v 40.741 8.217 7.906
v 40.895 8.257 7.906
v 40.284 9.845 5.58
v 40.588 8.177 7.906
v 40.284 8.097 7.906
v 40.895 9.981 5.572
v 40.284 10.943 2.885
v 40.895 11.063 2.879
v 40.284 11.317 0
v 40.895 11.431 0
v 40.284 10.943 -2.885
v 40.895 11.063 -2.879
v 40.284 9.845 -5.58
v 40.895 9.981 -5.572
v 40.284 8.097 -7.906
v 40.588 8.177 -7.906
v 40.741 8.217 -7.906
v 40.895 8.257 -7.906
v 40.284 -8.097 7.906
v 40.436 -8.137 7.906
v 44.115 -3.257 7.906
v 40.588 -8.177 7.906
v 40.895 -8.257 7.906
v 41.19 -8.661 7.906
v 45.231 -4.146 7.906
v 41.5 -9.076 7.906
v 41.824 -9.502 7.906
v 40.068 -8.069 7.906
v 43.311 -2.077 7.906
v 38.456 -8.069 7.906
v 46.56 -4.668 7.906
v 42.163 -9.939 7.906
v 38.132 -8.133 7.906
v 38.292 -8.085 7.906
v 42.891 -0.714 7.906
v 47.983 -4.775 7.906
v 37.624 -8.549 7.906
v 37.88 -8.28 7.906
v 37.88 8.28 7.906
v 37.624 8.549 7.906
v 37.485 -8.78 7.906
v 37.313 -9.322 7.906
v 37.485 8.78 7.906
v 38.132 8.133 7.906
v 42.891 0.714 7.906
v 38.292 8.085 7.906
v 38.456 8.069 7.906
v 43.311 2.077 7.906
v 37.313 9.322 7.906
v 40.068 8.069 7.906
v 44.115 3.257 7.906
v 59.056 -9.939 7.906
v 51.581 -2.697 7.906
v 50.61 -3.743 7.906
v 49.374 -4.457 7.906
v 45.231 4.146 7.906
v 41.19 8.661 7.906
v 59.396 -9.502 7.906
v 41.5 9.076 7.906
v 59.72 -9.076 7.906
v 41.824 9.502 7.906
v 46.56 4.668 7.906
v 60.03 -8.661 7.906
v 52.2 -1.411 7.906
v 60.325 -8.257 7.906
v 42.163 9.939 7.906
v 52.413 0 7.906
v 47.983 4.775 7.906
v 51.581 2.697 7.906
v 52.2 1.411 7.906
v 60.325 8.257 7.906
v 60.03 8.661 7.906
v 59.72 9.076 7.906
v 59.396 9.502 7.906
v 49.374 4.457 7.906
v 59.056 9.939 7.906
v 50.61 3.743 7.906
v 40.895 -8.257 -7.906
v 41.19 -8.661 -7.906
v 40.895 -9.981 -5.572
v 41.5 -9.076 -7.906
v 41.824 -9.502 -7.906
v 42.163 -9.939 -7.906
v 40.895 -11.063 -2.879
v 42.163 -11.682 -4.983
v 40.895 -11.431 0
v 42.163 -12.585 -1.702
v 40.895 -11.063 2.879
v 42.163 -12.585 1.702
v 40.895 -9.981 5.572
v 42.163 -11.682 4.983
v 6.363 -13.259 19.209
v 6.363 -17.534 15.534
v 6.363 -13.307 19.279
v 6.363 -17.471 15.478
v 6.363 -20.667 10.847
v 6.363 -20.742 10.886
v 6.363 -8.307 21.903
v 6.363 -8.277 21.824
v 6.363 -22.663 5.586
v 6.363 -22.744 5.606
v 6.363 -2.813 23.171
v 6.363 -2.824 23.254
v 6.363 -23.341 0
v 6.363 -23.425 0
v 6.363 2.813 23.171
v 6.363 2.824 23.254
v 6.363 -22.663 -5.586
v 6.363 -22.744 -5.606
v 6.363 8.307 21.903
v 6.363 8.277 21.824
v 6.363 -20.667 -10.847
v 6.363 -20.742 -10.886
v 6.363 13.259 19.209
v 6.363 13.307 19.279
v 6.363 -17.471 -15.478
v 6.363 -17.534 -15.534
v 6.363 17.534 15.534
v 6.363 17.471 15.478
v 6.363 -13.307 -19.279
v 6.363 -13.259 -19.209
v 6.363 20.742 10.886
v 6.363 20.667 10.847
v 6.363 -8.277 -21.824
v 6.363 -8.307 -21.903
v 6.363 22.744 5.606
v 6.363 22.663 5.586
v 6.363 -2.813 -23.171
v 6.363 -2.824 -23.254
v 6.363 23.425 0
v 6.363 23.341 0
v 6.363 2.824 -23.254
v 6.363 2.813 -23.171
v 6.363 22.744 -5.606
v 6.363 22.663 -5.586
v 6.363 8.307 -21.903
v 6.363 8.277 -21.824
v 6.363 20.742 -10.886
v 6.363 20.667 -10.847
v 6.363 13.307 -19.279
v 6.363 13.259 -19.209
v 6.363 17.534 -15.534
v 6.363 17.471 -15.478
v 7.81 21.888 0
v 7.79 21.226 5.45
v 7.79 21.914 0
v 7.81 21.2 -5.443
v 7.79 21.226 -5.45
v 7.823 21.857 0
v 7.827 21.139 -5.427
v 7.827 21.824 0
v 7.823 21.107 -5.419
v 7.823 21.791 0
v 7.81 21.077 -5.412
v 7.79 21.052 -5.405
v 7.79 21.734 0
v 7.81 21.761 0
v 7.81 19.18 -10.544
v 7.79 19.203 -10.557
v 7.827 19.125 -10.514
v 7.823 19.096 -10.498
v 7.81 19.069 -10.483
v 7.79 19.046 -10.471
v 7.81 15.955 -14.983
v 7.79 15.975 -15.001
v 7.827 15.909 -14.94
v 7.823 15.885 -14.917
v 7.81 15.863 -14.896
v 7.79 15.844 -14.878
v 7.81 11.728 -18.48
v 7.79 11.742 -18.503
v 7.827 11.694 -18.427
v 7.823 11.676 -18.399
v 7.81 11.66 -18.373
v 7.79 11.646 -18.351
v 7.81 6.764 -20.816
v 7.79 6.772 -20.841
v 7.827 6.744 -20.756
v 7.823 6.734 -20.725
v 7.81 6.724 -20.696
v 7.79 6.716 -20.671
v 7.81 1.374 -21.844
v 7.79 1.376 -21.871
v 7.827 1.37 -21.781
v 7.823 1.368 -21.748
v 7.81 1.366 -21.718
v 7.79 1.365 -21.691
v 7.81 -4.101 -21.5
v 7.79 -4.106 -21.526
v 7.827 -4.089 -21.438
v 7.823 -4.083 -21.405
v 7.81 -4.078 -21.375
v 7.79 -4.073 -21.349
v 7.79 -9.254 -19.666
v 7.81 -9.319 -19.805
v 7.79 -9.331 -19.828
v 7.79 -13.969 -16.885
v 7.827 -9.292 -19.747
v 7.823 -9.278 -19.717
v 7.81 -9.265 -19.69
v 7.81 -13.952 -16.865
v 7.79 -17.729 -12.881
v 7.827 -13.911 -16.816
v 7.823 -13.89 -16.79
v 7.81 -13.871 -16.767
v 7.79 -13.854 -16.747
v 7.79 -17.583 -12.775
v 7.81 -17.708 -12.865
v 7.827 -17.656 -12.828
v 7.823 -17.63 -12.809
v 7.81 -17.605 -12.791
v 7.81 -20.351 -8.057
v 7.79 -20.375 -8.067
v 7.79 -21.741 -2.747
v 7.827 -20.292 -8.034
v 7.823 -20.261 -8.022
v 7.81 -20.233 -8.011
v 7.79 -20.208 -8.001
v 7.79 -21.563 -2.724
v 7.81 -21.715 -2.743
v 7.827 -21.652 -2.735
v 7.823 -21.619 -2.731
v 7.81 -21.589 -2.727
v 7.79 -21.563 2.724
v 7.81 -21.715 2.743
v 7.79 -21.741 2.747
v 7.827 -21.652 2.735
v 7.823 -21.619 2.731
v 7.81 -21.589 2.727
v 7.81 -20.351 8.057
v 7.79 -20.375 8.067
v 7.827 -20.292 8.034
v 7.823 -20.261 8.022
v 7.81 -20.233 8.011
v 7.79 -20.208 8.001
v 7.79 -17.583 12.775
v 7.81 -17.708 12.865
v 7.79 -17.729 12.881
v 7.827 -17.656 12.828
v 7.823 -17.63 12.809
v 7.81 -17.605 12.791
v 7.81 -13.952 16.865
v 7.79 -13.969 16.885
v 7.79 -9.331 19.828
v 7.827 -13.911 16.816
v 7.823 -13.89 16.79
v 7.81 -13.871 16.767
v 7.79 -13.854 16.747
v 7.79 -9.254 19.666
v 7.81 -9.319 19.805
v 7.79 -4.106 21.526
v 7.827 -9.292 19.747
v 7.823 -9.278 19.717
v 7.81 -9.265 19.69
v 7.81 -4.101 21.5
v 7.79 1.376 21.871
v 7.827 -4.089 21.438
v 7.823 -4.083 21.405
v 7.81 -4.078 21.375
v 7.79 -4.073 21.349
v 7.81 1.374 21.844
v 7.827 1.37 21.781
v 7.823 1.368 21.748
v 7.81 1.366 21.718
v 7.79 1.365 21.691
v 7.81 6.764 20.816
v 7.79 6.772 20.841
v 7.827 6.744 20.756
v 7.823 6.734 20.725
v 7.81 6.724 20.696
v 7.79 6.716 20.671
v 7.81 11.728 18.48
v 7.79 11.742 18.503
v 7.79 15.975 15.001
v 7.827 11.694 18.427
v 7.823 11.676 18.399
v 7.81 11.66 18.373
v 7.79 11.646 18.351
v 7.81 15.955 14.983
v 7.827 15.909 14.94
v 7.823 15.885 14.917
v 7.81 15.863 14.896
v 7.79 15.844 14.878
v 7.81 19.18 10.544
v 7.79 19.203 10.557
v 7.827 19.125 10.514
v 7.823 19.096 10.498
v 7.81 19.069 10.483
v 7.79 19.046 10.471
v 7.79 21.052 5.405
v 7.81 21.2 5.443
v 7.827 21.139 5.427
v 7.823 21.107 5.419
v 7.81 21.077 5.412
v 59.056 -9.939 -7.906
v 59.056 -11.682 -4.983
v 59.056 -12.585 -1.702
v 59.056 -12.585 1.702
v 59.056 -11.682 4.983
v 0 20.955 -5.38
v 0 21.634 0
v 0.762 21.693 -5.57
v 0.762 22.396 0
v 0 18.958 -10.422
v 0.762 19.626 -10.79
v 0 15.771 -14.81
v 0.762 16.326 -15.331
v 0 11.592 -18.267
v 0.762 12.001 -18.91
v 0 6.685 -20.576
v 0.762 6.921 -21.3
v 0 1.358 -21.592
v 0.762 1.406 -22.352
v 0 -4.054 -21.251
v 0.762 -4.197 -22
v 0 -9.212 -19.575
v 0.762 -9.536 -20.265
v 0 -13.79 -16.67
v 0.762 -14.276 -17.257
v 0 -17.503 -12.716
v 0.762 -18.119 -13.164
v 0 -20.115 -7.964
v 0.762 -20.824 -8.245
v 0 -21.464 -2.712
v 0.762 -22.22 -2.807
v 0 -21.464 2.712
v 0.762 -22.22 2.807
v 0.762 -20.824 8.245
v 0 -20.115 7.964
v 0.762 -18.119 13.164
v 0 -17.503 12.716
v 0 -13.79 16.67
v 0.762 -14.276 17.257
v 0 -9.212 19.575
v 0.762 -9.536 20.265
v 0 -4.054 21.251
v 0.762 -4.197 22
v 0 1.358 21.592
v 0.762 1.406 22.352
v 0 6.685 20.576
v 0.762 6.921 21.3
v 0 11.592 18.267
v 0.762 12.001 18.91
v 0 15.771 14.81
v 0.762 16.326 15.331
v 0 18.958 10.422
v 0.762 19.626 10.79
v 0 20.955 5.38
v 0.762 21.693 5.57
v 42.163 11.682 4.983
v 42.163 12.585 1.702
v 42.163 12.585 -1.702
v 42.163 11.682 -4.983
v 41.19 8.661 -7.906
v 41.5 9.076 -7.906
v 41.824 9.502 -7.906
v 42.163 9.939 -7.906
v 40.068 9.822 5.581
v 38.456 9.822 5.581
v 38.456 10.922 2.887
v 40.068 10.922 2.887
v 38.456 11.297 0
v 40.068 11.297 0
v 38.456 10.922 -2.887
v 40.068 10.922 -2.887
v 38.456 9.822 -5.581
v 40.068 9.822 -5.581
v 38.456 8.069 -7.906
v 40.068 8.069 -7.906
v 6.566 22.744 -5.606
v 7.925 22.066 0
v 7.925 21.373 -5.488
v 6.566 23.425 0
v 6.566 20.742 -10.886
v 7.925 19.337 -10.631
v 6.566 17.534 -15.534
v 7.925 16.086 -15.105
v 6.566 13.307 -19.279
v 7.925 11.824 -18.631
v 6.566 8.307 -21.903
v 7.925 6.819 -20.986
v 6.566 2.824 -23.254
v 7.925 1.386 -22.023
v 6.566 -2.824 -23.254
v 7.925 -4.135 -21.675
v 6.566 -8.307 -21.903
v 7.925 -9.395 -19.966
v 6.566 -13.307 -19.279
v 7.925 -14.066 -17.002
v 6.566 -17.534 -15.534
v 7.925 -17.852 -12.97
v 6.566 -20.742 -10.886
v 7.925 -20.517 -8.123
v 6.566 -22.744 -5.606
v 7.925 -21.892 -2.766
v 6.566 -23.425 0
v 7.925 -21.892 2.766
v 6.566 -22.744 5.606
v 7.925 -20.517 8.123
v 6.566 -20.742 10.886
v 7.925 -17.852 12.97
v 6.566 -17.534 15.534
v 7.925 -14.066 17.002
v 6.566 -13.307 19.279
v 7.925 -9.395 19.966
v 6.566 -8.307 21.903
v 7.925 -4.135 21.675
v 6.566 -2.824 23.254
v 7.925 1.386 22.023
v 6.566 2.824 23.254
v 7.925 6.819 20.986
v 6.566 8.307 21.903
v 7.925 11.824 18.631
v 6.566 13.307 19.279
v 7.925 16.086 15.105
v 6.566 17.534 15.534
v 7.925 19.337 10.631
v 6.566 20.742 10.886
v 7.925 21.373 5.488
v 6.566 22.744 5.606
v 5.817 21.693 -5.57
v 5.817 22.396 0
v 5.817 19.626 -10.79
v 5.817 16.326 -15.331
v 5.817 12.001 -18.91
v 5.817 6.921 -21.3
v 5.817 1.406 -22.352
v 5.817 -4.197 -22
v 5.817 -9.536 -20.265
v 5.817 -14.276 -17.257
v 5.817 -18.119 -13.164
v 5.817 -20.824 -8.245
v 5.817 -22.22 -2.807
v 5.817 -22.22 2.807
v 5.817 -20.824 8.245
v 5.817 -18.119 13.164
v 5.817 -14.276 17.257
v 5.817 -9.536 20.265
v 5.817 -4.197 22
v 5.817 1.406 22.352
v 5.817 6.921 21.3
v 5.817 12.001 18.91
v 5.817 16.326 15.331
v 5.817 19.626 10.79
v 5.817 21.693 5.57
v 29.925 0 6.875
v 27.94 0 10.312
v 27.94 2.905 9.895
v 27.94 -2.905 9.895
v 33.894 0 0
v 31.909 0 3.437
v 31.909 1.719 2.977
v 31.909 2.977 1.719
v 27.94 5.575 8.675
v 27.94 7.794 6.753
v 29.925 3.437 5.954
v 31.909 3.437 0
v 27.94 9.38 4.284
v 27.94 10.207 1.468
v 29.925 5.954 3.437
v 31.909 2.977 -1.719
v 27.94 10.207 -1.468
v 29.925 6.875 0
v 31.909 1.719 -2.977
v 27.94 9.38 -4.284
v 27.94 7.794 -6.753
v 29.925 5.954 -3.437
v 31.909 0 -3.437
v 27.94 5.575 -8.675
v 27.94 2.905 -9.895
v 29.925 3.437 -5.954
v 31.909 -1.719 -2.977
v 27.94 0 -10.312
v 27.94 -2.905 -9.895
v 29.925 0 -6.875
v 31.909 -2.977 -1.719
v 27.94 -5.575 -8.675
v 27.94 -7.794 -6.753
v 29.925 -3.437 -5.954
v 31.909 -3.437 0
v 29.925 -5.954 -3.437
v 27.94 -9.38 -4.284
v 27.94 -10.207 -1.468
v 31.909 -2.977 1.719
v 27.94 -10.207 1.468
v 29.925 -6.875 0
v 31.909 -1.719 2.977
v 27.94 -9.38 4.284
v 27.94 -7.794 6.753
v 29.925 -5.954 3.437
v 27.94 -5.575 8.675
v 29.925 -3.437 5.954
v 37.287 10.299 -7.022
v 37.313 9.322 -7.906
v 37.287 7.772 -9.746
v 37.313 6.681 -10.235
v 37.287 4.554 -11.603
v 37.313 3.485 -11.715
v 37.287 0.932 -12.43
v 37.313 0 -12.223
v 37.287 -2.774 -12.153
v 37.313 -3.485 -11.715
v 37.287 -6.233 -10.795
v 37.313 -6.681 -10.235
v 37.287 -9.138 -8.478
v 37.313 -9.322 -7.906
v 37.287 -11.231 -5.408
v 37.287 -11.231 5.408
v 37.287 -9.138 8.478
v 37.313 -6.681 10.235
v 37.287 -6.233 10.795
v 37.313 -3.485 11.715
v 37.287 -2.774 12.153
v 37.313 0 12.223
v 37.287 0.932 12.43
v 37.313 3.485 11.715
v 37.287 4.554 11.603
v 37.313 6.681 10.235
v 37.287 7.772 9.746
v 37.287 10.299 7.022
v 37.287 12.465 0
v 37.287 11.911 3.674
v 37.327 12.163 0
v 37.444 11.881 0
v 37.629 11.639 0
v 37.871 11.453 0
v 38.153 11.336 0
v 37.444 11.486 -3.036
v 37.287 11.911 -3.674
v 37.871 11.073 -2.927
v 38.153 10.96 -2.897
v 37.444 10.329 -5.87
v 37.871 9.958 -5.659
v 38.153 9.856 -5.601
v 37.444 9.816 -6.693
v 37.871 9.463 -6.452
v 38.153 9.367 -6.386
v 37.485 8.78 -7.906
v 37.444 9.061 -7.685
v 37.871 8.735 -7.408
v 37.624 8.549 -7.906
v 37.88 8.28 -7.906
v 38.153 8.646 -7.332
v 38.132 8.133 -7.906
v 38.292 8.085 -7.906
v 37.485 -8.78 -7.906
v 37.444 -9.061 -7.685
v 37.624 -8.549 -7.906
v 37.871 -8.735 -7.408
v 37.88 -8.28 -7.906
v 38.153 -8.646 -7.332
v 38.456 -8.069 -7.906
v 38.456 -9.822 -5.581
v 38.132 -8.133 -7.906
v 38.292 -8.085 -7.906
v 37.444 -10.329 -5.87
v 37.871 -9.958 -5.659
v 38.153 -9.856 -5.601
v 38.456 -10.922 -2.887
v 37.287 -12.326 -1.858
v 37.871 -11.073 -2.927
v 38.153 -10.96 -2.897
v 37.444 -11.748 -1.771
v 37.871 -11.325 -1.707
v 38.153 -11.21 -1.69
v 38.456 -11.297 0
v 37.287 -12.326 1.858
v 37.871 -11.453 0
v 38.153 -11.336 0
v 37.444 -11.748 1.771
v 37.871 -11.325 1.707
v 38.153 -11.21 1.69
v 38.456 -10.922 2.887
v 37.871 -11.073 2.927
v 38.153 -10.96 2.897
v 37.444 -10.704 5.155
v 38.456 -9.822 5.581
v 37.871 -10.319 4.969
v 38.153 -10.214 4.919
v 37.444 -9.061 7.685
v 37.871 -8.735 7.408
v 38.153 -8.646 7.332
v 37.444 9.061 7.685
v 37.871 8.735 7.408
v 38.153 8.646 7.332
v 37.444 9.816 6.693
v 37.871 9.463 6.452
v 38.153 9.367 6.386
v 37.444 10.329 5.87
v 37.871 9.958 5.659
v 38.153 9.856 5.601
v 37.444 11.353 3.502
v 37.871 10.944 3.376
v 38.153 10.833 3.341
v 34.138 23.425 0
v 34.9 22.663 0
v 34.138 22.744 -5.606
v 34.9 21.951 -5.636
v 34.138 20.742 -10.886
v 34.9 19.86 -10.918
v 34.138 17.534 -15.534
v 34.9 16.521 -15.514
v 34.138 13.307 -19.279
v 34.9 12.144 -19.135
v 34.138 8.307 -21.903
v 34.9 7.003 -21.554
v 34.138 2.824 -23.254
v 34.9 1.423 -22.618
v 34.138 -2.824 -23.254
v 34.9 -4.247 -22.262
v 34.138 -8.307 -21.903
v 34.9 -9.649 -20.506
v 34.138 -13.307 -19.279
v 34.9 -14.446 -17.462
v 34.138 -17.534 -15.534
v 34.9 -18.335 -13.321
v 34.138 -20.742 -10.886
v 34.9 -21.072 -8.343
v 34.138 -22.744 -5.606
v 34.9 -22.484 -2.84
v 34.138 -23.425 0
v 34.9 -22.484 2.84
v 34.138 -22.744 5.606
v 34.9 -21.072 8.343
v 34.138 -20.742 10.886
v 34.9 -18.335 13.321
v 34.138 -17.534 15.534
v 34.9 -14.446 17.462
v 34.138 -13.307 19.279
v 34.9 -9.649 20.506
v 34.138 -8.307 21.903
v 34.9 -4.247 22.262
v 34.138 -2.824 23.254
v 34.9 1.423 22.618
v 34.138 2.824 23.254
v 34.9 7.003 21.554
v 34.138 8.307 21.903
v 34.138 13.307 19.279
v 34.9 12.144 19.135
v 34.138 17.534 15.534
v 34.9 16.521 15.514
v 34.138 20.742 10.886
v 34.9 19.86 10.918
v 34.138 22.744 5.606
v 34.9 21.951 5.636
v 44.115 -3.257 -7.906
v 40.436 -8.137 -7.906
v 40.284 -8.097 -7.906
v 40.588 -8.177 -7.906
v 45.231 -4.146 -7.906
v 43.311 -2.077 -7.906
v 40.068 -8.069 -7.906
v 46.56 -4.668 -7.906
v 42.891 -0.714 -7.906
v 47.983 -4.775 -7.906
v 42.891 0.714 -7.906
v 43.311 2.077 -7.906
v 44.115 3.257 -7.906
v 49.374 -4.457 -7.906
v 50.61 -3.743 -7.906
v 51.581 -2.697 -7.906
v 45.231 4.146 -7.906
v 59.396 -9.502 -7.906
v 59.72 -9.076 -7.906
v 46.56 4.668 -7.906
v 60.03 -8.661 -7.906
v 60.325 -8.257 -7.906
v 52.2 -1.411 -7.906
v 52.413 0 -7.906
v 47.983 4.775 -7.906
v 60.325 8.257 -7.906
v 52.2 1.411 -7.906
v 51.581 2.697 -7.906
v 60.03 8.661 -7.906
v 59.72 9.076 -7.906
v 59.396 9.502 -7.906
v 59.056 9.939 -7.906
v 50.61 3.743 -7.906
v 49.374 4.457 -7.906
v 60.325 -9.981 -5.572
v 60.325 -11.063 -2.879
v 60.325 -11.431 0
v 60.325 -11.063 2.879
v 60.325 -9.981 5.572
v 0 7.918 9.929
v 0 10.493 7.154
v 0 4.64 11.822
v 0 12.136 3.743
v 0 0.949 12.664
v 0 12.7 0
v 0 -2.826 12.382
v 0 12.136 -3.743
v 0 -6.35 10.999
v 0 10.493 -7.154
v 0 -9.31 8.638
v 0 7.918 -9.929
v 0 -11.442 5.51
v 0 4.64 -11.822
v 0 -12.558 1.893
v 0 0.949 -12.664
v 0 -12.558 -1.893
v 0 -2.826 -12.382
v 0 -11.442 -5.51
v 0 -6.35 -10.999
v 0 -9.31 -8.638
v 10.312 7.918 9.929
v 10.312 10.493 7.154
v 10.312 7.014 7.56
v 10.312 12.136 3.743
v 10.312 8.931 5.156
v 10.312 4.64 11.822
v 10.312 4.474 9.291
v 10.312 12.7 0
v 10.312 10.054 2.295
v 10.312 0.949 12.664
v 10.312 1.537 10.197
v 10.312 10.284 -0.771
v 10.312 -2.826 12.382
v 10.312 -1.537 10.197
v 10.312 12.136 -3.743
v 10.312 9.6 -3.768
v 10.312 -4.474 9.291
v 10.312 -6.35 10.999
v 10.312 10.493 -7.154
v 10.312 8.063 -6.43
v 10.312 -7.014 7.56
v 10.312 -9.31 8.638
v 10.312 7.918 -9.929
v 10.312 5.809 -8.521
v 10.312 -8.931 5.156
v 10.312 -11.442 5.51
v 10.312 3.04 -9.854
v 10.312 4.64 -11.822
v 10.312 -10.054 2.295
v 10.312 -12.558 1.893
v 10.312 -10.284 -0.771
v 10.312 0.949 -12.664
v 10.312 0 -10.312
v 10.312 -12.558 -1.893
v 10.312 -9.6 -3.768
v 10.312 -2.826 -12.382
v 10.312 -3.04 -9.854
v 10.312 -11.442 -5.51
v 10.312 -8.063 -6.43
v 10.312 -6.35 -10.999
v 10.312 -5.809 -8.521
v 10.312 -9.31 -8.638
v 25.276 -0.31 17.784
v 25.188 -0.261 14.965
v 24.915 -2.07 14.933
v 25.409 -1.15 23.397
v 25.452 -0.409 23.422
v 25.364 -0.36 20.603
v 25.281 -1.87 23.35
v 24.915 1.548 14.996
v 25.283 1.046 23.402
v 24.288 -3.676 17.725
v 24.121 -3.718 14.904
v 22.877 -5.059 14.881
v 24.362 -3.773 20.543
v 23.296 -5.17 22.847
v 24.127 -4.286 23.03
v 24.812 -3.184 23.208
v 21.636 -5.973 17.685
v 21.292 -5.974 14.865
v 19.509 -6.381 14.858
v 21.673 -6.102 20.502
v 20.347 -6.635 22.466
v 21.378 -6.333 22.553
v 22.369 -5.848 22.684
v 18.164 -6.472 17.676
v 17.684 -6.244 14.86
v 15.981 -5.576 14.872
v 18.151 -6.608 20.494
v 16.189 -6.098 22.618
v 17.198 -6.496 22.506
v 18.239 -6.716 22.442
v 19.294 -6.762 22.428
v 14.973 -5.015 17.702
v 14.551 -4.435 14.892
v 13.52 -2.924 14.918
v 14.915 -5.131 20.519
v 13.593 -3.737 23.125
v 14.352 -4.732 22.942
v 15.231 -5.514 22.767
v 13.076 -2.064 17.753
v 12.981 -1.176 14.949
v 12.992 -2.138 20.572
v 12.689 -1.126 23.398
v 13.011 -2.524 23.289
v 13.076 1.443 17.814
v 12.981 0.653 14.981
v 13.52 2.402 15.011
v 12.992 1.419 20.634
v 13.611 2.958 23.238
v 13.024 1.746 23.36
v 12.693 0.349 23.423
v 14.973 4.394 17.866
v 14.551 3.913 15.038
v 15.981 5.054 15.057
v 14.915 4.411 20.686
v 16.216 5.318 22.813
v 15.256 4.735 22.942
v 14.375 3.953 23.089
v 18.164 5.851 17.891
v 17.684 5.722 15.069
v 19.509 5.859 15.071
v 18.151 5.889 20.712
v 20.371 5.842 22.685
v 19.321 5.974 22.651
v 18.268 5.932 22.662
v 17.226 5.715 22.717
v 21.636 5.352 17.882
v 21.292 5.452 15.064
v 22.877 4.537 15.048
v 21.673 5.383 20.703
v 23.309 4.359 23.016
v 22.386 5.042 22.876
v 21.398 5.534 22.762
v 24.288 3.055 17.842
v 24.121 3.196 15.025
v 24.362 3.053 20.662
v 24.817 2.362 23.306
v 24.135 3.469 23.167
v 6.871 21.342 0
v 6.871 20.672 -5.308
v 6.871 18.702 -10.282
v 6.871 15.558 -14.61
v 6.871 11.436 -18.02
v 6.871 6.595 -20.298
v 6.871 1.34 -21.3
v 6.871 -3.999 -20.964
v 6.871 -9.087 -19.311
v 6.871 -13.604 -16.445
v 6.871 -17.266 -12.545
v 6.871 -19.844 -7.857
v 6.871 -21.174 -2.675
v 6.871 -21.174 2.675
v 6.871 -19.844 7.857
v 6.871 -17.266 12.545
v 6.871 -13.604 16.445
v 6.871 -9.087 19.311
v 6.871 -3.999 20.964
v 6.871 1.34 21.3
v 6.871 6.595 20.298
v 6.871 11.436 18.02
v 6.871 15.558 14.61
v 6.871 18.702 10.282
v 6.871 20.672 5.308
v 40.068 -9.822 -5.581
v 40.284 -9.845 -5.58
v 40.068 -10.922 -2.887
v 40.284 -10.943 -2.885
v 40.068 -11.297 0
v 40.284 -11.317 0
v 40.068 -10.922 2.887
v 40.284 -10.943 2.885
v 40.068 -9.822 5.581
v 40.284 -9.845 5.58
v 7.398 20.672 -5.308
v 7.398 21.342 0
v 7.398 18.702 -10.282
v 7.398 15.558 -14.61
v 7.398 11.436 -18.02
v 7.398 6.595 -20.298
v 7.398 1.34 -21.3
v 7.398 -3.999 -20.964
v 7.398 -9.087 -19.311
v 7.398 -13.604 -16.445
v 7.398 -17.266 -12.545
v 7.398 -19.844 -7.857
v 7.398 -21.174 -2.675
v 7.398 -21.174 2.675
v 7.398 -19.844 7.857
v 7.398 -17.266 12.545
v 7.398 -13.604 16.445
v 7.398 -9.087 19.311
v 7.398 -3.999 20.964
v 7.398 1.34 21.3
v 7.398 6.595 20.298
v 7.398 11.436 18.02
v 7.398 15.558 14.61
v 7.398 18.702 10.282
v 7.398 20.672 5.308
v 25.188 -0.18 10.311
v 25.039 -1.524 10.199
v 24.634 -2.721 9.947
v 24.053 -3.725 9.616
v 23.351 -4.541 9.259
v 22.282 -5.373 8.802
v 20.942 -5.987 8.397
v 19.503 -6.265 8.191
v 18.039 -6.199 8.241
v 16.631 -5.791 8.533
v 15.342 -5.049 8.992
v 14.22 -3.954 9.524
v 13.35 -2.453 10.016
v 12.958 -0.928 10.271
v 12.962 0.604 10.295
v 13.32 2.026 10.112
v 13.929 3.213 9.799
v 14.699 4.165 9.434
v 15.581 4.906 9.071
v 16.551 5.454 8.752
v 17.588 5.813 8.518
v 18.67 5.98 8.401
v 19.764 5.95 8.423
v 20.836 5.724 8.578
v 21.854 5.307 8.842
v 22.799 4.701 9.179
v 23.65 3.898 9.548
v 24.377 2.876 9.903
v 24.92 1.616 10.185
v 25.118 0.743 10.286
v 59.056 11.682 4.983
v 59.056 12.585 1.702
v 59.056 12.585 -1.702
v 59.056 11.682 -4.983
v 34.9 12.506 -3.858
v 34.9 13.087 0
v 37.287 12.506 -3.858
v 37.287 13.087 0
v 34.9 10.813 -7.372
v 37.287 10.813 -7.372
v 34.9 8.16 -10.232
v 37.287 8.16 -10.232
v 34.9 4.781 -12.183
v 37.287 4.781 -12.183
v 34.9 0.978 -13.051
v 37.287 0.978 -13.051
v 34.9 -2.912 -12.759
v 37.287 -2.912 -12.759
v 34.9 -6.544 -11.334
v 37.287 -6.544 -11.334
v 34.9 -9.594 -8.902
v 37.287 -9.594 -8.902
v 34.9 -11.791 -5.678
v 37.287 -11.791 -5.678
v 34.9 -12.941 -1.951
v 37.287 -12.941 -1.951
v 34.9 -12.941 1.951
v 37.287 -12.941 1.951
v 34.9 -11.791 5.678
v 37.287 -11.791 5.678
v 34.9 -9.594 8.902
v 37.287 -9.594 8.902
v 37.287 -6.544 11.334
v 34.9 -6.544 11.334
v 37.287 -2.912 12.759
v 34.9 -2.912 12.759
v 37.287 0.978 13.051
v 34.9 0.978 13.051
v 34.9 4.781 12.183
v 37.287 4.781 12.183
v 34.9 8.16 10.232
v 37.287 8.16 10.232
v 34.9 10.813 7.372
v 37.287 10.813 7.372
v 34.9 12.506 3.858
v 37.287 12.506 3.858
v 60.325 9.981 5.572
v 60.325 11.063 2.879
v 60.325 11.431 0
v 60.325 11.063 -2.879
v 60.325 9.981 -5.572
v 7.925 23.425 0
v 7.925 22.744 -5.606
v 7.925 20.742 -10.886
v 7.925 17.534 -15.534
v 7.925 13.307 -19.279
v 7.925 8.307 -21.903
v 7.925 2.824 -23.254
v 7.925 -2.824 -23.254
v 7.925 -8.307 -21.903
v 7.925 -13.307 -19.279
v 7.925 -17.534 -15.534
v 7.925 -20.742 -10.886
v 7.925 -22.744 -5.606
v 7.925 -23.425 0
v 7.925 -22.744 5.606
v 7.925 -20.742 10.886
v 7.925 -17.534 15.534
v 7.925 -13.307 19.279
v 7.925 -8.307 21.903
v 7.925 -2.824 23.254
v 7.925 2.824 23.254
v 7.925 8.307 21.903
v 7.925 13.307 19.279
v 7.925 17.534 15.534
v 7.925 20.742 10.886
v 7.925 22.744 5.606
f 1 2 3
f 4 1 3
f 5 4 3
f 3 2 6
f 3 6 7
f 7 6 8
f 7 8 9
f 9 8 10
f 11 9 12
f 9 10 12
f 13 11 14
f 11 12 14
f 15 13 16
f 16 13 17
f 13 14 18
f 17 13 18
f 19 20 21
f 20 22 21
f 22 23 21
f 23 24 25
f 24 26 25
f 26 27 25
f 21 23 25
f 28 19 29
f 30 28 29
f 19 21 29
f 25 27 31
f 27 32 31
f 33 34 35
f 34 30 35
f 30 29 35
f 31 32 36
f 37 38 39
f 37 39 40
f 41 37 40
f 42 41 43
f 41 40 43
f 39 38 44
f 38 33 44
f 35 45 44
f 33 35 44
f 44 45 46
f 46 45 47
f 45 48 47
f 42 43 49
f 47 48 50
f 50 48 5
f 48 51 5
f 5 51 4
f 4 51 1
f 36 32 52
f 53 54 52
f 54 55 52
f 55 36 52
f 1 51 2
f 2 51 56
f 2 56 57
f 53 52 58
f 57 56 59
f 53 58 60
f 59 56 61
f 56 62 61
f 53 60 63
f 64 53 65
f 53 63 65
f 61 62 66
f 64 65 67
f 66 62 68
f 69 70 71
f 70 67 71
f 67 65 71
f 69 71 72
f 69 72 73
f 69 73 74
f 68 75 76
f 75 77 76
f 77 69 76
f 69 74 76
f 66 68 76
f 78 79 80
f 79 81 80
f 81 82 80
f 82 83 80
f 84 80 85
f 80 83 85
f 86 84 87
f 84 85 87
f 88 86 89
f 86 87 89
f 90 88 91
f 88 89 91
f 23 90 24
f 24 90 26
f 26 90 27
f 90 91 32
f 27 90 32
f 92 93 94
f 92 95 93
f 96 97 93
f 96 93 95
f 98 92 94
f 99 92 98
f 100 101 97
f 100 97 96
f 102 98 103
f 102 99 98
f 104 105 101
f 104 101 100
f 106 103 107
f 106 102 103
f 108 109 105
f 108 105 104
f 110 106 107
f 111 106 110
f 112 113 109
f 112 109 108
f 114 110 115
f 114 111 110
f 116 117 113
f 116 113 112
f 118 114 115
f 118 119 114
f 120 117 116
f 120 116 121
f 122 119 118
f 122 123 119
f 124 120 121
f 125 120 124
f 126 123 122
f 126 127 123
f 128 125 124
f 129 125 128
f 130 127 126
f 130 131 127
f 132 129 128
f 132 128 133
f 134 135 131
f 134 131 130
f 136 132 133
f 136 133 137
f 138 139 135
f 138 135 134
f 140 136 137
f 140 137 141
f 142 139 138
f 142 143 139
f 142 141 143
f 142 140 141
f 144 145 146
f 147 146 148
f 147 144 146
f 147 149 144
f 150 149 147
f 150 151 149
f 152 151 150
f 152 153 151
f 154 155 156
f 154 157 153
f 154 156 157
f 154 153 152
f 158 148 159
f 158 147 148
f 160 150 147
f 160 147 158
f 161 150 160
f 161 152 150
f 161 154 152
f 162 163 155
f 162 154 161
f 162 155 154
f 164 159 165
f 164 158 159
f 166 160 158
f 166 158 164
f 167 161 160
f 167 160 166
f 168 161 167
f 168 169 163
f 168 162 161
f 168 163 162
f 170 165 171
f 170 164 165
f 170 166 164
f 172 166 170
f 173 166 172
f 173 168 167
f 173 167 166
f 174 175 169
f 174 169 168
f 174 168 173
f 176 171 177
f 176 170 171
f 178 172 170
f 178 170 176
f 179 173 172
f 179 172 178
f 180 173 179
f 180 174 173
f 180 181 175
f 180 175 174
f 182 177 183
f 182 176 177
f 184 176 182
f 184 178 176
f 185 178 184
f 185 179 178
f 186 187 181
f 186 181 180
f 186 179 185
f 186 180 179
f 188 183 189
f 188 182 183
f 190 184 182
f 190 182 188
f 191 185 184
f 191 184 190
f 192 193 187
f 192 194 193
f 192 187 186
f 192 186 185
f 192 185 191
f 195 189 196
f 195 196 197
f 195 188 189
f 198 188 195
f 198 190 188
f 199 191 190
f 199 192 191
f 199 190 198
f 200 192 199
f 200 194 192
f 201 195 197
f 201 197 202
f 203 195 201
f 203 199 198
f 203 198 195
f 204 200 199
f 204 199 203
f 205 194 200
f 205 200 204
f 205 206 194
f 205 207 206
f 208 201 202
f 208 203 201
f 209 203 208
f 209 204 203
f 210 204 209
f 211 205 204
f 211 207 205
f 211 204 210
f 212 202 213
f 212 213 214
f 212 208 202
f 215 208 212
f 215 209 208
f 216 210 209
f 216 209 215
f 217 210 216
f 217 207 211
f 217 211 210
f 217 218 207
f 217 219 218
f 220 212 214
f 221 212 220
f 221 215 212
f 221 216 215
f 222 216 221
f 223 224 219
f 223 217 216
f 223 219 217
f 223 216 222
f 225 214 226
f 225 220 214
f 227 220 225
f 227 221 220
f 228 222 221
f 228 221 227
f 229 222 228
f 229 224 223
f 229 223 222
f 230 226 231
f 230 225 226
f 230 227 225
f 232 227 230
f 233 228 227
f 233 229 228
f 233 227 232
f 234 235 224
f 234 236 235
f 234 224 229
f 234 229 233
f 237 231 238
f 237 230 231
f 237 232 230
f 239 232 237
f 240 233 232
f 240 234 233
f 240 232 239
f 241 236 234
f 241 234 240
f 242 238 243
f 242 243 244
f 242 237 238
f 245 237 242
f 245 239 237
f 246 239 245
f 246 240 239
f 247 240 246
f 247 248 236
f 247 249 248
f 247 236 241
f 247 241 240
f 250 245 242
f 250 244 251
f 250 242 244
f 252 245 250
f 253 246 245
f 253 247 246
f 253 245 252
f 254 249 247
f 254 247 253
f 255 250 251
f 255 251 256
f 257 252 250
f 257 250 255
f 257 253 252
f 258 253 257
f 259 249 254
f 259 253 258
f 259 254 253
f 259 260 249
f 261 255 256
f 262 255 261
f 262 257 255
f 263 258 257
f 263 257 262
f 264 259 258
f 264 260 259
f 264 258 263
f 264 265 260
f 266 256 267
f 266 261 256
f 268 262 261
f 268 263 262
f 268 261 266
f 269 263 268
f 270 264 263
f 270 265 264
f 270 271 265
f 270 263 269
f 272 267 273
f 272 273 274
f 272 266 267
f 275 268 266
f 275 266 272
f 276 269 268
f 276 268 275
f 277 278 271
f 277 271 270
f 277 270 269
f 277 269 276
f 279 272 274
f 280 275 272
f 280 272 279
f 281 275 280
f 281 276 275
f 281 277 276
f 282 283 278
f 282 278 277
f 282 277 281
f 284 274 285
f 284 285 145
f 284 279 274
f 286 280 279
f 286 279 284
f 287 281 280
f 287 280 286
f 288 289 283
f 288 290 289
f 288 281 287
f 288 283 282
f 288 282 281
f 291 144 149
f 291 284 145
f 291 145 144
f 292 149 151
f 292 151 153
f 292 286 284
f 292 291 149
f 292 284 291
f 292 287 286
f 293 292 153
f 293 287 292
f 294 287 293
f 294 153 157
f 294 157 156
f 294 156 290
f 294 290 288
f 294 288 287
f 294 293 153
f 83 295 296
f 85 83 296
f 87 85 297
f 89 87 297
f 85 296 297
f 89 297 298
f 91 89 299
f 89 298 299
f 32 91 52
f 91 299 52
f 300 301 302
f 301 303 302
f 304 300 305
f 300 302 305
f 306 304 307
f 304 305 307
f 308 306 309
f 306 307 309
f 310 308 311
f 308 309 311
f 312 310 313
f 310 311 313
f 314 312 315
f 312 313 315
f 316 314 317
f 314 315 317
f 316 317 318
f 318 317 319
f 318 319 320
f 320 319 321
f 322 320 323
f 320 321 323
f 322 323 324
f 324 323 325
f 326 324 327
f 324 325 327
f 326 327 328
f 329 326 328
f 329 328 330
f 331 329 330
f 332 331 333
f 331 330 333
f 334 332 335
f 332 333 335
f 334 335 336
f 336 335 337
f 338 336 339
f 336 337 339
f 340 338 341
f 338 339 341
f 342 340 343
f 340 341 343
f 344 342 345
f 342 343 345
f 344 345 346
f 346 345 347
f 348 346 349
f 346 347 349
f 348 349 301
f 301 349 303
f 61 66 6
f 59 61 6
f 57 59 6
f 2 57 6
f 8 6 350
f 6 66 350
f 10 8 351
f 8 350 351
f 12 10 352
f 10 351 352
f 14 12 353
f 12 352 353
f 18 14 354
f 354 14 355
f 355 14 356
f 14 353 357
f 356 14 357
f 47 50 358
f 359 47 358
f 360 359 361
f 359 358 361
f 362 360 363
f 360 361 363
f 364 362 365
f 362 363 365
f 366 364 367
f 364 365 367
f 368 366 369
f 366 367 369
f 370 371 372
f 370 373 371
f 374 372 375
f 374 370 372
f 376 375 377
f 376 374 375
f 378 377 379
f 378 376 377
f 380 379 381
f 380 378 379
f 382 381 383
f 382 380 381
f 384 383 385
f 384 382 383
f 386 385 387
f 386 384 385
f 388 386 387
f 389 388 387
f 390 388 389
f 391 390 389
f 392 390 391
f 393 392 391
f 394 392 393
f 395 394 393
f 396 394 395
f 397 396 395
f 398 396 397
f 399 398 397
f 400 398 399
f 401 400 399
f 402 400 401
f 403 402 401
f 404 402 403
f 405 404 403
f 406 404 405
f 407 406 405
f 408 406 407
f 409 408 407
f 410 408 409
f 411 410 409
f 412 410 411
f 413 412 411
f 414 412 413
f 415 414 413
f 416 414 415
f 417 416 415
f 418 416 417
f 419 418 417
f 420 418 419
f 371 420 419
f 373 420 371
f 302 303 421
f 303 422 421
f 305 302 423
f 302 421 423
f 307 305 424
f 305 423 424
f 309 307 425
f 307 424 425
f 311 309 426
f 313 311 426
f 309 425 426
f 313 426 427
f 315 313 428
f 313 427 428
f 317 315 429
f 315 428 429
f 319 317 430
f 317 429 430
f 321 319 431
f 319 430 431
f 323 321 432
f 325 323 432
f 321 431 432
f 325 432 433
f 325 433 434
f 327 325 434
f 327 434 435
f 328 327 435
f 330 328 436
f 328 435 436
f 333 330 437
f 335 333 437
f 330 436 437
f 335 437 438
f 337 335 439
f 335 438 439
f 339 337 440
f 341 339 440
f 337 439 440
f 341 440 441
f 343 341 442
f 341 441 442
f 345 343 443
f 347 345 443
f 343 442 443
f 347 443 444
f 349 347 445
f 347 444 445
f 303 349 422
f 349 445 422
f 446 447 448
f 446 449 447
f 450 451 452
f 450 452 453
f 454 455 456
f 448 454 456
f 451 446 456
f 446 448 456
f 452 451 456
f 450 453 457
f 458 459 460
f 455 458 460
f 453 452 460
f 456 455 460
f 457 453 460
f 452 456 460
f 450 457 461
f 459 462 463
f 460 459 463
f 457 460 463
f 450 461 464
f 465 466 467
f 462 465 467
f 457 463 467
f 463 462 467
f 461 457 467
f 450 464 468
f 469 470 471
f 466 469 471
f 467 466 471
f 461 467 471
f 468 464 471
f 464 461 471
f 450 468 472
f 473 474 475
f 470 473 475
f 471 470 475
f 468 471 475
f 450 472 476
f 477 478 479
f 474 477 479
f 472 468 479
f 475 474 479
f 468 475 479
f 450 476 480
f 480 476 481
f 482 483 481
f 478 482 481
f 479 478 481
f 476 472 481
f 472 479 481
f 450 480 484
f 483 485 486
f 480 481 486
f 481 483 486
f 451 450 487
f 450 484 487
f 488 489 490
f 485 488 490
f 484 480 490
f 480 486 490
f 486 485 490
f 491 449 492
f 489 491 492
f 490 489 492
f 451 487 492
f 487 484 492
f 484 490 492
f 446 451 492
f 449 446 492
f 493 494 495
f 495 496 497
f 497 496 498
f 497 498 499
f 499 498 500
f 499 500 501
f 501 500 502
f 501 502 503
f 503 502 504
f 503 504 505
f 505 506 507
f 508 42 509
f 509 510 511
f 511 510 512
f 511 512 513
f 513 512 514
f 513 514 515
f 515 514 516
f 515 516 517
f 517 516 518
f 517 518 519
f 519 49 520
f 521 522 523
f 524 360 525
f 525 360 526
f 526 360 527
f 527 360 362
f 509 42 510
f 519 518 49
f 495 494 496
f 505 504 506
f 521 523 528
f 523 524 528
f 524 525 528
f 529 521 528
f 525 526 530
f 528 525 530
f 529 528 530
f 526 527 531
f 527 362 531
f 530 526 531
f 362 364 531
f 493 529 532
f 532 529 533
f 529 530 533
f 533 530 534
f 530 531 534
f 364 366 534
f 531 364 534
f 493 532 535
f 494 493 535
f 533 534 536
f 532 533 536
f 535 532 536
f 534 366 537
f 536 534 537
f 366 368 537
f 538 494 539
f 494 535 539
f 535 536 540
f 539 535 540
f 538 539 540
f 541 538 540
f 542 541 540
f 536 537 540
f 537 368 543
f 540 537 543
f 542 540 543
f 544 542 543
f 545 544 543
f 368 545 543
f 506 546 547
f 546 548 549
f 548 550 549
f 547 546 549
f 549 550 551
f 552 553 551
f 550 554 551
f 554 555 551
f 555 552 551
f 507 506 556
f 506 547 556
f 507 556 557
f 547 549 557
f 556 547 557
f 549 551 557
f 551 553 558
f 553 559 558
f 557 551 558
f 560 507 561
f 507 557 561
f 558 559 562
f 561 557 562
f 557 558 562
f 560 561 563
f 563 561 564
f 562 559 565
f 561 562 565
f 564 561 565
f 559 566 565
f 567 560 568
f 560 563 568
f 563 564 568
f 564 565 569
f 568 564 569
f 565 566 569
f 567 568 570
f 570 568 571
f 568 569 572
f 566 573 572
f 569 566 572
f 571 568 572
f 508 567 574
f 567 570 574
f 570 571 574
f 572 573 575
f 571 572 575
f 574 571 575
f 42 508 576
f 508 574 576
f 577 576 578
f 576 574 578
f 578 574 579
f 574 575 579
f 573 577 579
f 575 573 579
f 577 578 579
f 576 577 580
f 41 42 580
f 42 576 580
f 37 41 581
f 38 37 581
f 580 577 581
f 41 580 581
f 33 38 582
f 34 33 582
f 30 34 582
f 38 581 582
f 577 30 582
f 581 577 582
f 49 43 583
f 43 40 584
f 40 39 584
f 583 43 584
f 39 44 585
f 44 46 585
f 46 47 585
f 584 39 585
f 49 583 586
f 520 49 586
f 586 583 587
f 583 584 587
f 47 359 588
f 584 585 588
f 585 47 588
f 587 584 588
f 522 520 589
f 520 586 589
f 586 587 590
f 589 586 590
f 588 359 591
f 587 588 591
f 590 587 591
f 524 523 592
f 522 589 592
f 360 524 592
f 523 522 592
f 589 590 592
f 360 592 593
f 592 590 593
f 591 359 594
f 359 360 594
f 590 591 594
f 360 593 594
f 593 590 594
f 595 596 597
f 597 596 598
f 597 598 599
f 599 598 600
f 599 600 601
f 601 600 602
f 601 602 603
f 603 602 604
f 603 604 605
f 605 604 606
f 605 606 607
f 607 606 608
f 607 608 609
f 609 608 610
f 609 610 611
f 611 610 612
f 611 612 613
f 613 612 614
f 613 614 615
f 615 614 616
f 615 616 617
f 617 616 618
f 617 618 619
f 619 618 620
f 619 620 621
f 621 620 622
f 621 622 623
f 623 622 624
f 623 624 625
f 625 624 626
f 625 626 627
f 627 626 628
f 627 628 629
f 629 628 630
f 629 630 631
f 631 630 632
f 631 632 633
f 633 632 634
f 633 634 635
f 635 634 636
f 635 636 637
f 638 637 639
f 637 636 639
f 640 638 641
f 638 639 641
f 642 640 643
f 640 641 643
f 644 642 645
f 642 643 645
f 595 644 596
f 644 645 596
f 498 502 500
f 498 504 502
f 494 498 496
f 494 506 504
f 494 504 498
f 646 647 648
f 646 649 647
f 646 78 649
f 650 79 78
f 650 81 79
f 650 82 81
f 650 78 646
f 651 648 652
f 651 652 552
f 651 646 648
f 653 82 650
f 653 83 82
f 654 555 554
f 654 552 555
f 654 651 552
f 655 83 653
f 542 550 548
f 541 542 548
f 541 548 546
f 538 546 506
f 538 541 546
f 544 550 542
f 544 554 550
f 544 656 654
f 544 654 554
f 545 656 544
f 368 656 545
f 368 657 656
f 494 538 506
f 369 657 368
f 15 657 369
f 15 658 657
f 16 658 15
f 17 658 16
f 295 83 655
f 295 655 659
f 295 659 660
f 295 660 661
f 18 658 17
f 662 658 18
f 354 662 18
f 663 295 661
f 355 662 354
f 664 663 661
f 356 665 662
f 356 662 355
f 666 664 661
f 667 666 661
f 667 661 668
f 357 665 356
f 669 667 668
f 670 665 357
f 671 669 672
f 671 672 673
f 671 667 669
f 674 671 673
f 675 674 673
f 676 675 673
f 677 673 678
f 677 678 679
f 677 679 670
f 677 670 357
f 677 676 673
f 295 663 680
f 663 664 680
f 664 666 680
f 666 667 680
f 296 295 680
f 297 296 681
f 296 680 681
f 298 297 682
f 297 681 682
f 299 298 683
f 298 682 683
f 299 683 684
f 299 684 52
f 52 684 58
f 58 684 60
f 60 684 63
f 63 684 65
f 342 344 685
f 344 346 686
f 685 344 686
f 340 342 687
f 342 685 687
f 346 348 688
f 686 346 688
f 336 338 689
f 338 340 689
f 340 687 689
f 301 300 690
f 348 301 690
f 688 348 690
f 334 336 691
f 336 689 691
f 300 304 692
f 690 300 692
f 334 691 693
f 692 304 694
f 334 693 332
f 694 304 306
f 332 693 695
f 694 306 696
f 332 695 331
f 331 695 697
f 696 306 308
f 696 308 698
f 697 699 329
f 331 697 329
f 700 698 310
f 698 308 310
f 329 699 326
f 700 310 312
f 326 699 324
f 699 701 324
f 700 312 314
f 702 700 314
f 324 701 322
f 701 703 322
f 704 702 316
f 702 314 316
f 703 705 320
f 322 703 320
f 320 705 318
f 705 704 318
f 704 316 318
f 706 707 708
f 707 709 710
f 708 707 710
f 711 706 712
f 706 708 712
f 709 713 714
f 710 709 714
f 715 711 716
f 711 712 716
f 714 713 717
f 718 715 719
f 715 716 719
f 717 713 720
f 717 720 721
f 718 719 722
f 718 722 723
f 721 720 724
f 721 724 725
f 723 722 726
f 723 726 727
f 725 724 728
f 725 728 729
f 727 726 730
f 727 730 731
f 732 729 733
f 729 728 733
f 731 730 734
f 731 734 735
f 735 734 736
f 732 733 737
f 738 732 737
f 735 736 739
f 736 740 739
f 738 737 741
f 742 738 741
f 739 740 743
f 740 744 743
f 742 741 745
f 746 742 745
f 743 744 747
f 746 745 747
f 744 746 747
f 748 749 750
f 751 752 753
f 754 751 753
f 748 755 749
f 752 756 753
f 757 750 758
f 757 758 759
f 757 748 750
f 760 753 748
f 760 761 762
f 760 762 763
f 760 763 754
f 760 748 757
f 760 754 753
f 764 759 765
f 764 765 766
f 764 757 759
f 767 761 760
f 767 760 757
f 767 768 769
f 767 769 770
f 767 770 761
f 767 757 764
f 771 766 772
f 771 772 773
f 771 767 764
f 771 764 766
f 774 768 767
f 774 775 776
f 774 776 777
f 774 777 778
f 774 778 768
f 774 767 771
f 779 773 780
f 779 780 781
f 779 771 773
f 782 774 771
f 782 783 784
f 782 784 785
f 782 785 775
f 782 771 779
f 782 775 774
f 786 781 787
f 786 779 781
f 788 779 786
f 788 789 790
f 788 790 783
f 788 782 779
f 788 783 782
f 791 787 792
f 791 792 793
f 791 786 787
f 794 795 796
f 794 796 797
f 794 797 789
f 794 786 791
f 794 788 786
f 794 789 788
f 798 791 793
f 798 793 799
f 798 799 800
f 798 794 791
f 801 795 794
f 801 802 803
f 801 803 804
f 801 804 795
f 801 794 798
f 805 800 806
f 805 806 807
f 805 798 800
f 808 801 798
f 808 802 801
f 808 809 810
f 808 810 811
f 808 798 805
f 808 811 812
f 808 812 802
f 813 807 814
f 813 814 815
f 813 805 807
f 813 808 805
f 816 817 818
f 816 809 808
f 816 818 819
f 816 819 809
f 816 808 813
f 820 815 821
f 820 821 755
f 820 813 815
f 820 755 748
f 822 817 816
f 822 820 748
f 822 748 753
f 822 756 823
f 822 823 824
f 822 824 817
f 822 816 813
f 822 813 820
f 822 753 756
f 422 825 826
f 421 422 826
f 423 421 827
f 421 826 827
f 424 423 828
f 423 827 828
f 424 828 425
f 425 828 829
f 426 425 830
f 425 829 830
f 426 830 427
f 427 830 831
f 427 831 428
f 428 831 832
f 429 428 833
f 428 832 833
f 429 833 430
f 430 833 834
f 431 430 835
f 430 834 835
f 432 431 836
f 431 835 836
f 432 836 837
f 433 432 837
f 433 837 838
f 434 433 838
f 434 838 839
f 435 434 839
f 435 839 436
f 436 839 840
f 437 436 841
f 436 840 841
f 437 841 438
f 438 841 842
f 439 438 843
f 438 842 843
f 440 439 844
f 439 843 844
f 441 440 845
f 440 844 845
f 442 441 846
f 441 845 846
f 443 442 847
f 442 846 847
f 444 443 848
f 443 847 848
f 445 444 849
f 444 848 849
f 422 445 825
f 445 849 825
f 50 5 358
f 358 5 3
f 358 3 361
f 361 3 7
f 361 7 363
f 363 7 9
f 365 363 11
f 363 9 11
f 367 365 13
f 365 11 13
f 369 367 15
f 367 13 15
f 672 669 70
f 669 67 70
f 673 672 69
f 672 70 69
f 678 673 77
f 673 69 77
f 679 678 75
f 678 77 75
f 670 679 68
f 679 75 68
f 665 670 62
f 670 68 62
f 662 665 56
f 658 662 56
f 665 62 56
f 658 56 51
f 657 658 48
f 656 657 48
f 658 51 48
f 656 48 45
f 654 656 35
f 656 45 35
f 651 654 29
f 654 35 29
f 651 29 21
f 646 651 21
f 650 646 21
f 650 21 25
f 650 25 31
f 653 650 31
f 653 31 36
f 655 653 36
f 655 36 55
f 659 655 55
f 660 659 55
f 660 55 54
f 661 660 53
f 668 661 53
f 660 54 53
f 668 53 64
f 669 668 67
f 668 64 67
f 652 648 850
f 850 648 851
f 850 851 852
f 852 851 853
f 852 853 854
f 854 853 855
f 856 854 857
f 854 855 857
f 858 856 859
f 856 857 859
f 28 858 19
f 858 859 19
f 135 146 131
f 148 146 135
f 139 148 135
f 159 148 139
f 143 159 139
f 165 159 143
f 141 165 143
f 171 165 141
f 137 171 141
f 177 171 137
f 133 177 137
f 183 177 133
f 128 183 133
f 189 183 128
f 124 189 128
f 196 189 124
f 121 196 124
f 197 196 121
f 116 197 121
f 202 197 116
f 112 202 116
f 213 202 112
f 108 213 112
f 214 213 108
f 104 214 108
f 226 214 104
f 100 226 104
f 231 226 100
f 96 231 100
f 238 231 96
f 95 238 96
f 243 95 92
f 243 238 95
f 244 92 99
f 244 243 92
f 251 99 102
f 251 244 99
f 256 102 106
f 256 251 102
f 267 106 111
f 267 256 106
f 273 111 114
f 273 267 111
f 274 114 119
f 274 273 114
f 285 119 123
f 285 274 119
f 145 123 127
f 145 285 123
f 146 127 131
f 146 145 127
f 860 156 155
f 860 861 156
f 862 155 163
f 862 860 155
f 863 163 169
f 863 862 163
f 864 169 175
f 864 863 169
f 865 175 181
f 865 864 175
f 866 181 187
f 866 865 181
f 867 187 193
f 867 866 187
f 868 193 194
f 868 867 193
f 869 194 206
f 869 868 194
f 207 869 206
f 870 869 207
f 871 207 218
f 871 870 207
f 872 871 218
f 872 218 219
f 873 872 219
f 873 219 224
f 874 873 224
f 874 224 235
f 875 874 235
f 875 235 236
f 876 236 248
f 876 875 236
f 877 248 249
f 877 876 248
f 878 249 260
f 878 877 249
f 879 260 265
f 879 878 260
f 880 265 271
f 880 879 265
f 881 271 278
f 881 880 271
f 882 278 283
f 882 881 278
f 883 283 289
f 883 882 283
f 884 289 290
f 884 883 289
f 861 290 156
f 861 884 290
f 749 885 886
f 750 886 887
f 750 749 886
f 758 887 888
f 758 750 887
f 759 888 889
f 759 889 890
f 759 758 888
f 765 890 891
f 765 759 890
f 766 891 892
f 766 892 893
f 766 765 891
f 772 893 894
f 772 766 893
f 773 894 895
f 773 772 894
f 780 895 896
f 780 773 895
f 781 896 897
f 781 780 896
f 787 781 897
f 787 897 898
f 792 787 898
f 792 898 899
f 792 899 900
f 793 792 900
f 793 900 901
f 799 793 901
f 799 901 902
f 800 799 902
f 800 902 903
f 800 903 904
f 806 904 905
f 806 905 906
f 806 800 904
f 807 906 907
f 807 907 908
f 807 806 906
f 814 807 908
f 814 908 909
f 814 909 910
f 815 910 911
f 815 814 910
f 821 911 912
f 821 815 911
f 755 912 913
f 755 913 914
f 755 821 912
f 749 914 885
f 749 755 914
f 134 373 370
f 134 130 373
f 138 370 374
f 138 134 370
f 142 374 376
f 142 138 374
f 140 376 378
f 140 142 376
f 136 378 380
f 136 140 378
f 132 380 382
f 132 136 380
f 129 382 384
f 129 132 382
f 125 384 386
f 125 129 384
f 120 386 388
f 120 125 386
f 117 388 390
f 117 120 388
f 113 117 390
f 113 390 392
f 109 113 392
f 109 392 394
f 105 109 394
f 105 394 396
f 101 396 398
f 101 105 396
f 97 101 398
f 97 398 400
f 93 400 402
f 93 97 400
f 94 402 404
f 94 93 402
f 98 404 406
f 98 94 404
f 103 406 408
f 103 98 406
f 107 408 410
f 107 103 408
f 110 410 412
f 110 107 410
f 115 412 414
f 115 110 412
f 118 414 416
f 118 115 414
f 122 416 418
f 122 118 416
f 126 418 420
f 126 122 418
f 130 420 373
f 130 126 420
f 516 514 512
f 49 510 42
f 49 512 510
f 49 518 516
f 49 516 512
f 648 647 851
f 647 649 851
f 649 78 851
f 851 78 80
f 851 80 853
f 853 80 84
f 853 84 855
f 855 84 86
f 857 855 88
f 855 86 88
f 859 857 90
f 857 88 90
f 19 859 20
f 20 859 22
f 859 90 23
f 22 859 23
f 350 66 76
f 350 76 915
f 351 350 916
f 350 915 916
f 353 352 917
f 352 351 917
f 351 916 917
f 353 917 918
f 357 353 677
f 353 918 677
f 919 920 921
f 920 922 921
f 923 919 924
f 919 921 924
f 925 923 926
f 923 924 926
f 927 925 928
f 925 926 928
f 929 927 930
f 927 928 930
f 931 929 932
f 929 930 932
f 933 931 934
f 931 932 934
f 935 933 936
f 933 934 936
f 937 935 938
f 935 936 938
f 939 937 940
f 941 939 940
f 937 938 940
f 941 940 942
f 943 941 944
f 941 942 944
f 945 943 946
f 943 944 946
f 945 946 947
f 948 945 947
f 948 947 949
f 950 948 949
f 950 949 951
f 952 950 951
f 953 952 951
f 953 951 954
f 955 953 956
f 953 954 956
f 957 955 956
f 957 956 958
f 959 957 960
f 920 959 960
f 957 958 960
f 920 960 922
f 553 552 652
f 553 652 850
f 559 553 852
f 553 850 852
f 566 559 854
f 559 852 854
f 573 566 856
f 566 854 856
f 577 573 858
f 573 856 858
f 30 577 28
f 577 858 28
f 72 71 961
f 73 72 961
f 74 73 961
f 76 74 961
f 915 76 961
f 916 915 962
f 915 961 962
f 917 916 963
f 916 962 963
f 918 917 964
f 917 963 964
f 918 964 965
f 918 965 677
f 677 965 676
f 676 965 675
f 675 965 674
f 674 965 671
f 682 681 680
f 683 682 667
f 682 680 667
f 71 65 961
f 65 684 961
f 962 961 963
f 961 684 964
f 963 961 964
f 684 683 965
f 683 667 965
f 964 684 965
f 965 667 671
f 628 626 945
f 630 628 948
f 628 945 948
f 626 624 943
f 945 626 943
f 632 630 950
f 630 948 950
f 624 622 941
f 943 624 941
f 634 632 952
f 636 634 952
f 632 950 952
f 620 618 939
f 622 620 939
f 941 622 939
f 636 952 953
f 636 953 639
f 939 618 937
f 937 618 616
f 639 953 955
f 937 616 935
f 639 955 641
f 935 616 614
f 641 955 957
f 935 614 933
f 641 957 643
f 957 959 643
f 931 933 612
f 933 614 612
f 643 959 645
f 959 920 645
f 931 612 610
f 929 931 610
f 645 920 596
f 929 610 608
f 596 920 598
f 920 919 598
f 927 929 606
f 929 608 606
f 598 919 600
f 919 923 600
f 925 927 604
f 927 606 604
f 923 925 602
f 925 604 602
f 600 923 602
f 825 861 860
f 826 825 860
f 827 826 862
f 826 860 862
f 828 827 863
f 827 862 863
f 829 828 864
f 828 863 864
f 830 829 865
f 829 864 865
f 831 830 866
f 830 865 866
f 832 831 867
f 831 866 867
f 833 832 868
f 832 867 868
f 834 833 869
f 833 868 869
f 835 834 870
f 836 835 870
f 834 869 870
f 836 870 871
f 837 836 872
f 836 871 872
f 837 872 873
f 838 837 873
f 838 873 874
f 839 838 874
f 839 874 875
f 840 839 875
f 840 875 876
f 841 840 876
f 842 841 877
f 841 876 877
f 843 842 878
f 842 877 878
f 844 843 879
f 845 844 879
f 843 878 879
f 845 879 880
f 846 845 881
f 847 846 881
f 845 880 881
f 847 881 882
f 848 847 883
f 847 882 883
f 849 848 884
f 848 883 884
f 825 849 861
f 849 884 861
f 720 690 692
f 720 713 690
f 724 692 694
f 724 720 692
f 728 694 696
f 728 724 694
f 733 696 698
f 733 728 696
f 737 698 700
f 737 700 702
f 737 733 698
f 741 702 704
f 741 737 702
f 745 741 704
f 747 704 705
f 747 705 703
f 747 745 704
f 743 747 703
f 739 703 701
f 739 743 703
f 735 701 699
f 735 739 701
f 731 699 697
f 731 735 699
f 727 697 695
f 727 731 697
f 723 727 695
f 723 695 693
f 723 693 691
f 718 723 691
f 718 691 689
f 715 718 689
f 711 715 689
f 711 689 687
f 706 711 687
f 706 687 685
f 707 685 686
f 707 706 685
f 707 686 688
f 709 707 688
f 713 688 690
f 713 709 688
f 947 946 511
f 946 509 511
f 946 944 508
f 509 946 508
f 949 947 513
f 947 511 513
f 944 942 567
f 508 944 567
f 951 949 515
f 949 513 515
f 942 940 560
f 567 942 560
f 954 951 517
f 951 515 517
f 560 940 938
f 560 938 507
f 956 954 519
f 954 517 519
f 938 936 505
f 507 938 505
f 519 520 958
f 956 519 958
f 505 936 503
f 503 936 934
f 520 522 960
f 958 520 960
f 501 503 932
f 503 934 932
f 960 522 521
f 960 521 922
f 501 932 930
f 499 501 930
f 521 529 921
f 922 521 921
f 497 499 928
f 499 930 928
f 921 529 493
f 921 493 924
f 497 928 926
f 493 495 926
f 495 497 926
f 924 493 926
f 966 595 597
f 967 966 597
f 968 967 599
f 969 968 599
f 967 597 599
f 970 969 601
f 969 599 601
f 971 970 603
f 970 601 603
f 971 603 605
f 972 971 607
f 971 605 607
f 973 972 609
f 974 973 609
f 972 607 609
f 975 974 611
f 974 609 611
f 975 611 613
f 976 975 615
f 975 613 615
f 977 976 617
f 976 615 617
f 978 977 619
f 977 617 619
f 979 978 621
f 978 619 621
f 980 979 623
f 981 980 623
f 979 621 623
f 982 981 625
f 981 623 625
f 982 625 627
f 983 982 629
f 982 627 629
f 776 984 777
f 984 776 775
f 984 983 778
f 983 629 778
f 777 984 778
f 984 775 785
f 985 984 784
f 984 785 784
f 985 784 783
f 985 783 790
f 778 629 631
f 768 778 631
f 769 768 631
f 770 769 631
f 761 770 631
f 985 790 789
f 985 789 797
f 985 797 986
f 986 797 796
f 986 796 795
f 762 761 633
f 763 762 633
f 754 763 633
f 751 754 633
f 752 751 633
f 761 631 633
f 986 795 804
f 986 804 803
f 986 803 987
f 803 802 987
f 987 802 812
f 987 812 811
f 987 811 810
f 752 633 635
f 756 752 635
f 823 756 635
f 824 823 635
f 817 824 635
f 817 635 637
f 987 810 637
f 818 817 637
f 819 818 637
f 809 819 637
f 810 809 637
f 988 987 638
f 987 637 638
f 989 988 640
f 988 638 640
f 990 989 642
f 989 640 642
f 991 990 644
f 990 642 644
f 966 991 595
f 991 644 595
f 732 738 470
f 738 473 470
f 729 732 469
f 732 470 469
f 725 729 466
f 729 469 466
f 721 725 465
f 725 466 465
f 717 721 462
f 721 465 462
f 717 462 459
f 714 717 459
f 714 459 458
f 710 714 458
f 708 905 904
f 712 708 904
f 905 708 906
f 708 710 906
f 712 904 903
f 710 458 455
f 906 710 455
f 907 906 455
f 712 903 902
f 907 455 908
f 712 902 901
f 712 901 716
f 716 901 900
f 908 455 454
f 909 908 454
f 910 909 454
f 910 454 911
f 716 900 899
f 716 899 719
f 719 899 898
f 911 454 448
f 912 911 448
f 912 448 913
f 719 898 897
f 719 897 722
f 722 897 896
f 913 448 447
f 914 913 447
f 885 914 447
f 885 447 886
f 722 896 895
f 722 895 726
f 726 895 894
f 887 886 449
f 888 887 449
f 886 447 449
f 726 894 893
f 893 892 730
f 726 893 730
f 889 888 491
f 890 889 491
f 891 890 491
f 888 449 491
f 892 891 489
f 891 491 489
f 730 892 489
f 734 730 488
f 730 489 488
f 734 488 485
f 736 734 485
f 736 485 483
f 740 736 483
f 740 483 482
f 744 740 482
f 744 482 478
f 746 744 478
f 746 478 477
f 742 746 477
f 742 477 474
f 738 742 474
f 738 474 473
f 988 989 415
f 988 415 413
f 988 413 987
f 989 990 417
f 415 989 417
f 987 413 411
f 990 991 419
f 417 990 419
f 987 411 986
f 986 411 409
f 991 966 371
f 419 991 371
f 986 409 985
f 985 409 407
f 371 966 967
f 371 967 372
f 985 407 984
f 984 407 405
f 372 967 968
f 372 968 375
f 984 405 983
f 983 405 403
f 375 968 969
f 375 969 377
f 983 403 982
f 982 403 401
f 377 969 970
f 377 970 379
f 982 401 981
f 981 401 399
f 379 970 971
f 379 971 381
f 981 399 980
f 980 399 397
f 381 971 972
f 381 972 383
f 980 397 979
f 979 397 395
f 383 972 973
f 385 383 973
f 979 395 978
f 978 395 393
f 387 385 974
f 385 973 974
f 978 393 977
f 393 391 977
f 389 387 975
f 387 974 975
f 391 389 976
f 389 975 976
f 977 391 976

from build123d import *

# Parameters (mm, degrees)
SKETCH3_W               = 93.7006
SKETCH3_H               = 187.4012
SKETCH3_W_2             = 15.8115
SKETCH3_H_2             = 93.7006
CUT_EXTRUDE1_DEPTH      = 23.0124
HOLE1_D                 = 20.6248
HOLE1_DEPTH             = 27.94
HOLE1_TIP               = 5.953866916
SKETCH7_W               = 10.3124
SKETCH7_H               = 12.7
CUT_EXTRUDE2_DEPTH      = 11.858625
CUT_EXTRUDE2_DEPTH_BACK = 11.858625
SKETCH9_R               = 4.7879


with BuildPart() as part:
    # Sketch1 → Revolve1 (revolve)
    with BuildSketch(Plane.XY):
        Polygon((0, 0), (0, 21.63445), (0.762, 22.39645), (5.8166, 22.39645), (6.8707, 21.34235), (7.9248, 21.34235), (7.9248, 23.42515), (34.1376, 23.42515), (34.8996, 22.66315), (34.8996, 0), align=None)
    revolve(axis=Axis((34.8996, 0, 0), (-1, 0, 0)))

    # Sketch2 → Revolve2 (revolve)
    with BuildSketch(Plane.XY):
        with BuildLine():
            Line((34.8996, 0), (34.8996, 13.08735))
            Line((34.8996, 13.08735), (37.2872, 13.08735))
            Line((37.2872, 13.08735), (37.2872, 12.46505))
            ThreePointArc((37.2872, 12.46505), (37.629416437, 11.638866437), (38.4556, 11.29665))
            Line((38.4556, 11.29665), (40.0685, 11.29665))
            ThreePointArc((40.0685, 11.29665), (40.176691084, 11.301669903), (40.283952505, 11.316686478))
            Line((40.283952505, 11.316686478), (40.894683563, 11.43127))
            Line((40.894683563, 11.43127), (42.163413563, 12.7))
            Line((42.163413563, 12.7), (59.05627, 12.7))
            Line((59.05627, 12.7), (60.325, 11.43127))
            Line((60.325, 11.43127), (60.325, 0))
            Line((60.325, 0), (34.8996, 0))
        make_face()
    revolve(axis=Axis((60.325, 0, 0), (-1, 0, 0)))

    # Sketch3 → Cut-Extrude1 (cut)
    with BuildSketch(Plane(origin=(60.325, 0, 0), x_dir=(0, 0, -1), z_dir=(1, 0, 0))):
        Rectangle(SKETCH3_W, SKETCH3_H)
        Rectangle(SKETCH3_W_2, SKETCH3_H_2, mode=Mode.SUBTRACT)
    extrude(amount=-CUT_EXTRUDE1_DEPTH, mode=Mode.SUBTRACT)

    # Hole1
    with Locations(Plane.ZY):
        with Locations((0, 0)):
            Hole(HOLE1_D / 2, depth=HOLE1_DEPTH)
            with Locations((0, 0, -(HOLE1_DEPTH + HOLE1_TIP / 2))):  # 120° drill point
                Cone(0, HOLE1_D / 2, HOLE1_TIP, mode=Mode.SUBTRACT)

    # Sketch6 → Cut-Revolve1 (revolve, cut)
    with BuildSketch(Plane(origin=(0, 0, 0), x_dir=(1, 0, 0), z_dir=(0, 0.9998476951563913, 0.01745240643728403))):
        Polygon((19.05, 0), (25.187961617, 0), (25.187961617, -14.96695), (25.452022746, -23.42515), (19.05, -23.42515), align=None)
    revolve(axis=Axis((19.05, -0.408825239, 23.421582236), (0, 0.01745240643728403, -0.9998476951563913)), mode=Mode.SUBTRACT)

    # Sketch7 → Cut-Revolve2 (revolve, cut)
    with BuildSketch(Plane.XY):
        with Locations((5.1562, 6.35)):
            Rectangle(SKETCH7_W, SKETCH7_H)
    revolve(axis=Axis((10.3124, 0, 0), (-1, 0, 0)), mode=Mode.SUBTRACT)

    # Sketch8 → Revolve3 (revolve)
    with BuildSketch(Plane.XY):
        with BuildLine():
            Line((6.362790712, 23.340981804), (7.789783697, 21.913988819))
            ThreePointArc((7.789783697, 21.913988819), (7.826981136, 21.824186258), (7.789783697, 21.734383697))
            Line((7.789783697, 21.734383697), (7.39775, 21.34235))
            Line((7.39775, 21.34235), (6.8707, 21.34235))
            Line((6.8707, 21.34235), (6.8707, 21.08835))
            Line((6.8707, 21.08835), (7.9248, 21.08835))
            Line((7.9248, 21.08835), (7.9248, 22.066340712))
            Line((7.9248, 22.066340712), (6.565990712, 23.42515))
            Line((6.565990712, 23.42515), (6.362790712, 23.42515))
            Line((6.362790712, 23.42515), (6.362790712, 23.340981804))
        make_face()
    revolve(axis=Axis((7.9248, 0, 0), (-1, 0, 0)))

    # Sketch9 → Cut-Extrude2 (cut, two sides: drawn at the far end of the back side and taken through both)
    with BuildSketch(Plane.XY.offset(-CUT_EXTRUDE2_DEPTH_BACK)):
        with Locations((47.625, 0)):
            Circle(SKETCH9_R)
    extrude(amount=CUT_EXTRUDE2_DEPTH + CUT_EXTRUDE2_DEPTH_BACK, mode=Mode.SUBTRACT)


solid = part.part
